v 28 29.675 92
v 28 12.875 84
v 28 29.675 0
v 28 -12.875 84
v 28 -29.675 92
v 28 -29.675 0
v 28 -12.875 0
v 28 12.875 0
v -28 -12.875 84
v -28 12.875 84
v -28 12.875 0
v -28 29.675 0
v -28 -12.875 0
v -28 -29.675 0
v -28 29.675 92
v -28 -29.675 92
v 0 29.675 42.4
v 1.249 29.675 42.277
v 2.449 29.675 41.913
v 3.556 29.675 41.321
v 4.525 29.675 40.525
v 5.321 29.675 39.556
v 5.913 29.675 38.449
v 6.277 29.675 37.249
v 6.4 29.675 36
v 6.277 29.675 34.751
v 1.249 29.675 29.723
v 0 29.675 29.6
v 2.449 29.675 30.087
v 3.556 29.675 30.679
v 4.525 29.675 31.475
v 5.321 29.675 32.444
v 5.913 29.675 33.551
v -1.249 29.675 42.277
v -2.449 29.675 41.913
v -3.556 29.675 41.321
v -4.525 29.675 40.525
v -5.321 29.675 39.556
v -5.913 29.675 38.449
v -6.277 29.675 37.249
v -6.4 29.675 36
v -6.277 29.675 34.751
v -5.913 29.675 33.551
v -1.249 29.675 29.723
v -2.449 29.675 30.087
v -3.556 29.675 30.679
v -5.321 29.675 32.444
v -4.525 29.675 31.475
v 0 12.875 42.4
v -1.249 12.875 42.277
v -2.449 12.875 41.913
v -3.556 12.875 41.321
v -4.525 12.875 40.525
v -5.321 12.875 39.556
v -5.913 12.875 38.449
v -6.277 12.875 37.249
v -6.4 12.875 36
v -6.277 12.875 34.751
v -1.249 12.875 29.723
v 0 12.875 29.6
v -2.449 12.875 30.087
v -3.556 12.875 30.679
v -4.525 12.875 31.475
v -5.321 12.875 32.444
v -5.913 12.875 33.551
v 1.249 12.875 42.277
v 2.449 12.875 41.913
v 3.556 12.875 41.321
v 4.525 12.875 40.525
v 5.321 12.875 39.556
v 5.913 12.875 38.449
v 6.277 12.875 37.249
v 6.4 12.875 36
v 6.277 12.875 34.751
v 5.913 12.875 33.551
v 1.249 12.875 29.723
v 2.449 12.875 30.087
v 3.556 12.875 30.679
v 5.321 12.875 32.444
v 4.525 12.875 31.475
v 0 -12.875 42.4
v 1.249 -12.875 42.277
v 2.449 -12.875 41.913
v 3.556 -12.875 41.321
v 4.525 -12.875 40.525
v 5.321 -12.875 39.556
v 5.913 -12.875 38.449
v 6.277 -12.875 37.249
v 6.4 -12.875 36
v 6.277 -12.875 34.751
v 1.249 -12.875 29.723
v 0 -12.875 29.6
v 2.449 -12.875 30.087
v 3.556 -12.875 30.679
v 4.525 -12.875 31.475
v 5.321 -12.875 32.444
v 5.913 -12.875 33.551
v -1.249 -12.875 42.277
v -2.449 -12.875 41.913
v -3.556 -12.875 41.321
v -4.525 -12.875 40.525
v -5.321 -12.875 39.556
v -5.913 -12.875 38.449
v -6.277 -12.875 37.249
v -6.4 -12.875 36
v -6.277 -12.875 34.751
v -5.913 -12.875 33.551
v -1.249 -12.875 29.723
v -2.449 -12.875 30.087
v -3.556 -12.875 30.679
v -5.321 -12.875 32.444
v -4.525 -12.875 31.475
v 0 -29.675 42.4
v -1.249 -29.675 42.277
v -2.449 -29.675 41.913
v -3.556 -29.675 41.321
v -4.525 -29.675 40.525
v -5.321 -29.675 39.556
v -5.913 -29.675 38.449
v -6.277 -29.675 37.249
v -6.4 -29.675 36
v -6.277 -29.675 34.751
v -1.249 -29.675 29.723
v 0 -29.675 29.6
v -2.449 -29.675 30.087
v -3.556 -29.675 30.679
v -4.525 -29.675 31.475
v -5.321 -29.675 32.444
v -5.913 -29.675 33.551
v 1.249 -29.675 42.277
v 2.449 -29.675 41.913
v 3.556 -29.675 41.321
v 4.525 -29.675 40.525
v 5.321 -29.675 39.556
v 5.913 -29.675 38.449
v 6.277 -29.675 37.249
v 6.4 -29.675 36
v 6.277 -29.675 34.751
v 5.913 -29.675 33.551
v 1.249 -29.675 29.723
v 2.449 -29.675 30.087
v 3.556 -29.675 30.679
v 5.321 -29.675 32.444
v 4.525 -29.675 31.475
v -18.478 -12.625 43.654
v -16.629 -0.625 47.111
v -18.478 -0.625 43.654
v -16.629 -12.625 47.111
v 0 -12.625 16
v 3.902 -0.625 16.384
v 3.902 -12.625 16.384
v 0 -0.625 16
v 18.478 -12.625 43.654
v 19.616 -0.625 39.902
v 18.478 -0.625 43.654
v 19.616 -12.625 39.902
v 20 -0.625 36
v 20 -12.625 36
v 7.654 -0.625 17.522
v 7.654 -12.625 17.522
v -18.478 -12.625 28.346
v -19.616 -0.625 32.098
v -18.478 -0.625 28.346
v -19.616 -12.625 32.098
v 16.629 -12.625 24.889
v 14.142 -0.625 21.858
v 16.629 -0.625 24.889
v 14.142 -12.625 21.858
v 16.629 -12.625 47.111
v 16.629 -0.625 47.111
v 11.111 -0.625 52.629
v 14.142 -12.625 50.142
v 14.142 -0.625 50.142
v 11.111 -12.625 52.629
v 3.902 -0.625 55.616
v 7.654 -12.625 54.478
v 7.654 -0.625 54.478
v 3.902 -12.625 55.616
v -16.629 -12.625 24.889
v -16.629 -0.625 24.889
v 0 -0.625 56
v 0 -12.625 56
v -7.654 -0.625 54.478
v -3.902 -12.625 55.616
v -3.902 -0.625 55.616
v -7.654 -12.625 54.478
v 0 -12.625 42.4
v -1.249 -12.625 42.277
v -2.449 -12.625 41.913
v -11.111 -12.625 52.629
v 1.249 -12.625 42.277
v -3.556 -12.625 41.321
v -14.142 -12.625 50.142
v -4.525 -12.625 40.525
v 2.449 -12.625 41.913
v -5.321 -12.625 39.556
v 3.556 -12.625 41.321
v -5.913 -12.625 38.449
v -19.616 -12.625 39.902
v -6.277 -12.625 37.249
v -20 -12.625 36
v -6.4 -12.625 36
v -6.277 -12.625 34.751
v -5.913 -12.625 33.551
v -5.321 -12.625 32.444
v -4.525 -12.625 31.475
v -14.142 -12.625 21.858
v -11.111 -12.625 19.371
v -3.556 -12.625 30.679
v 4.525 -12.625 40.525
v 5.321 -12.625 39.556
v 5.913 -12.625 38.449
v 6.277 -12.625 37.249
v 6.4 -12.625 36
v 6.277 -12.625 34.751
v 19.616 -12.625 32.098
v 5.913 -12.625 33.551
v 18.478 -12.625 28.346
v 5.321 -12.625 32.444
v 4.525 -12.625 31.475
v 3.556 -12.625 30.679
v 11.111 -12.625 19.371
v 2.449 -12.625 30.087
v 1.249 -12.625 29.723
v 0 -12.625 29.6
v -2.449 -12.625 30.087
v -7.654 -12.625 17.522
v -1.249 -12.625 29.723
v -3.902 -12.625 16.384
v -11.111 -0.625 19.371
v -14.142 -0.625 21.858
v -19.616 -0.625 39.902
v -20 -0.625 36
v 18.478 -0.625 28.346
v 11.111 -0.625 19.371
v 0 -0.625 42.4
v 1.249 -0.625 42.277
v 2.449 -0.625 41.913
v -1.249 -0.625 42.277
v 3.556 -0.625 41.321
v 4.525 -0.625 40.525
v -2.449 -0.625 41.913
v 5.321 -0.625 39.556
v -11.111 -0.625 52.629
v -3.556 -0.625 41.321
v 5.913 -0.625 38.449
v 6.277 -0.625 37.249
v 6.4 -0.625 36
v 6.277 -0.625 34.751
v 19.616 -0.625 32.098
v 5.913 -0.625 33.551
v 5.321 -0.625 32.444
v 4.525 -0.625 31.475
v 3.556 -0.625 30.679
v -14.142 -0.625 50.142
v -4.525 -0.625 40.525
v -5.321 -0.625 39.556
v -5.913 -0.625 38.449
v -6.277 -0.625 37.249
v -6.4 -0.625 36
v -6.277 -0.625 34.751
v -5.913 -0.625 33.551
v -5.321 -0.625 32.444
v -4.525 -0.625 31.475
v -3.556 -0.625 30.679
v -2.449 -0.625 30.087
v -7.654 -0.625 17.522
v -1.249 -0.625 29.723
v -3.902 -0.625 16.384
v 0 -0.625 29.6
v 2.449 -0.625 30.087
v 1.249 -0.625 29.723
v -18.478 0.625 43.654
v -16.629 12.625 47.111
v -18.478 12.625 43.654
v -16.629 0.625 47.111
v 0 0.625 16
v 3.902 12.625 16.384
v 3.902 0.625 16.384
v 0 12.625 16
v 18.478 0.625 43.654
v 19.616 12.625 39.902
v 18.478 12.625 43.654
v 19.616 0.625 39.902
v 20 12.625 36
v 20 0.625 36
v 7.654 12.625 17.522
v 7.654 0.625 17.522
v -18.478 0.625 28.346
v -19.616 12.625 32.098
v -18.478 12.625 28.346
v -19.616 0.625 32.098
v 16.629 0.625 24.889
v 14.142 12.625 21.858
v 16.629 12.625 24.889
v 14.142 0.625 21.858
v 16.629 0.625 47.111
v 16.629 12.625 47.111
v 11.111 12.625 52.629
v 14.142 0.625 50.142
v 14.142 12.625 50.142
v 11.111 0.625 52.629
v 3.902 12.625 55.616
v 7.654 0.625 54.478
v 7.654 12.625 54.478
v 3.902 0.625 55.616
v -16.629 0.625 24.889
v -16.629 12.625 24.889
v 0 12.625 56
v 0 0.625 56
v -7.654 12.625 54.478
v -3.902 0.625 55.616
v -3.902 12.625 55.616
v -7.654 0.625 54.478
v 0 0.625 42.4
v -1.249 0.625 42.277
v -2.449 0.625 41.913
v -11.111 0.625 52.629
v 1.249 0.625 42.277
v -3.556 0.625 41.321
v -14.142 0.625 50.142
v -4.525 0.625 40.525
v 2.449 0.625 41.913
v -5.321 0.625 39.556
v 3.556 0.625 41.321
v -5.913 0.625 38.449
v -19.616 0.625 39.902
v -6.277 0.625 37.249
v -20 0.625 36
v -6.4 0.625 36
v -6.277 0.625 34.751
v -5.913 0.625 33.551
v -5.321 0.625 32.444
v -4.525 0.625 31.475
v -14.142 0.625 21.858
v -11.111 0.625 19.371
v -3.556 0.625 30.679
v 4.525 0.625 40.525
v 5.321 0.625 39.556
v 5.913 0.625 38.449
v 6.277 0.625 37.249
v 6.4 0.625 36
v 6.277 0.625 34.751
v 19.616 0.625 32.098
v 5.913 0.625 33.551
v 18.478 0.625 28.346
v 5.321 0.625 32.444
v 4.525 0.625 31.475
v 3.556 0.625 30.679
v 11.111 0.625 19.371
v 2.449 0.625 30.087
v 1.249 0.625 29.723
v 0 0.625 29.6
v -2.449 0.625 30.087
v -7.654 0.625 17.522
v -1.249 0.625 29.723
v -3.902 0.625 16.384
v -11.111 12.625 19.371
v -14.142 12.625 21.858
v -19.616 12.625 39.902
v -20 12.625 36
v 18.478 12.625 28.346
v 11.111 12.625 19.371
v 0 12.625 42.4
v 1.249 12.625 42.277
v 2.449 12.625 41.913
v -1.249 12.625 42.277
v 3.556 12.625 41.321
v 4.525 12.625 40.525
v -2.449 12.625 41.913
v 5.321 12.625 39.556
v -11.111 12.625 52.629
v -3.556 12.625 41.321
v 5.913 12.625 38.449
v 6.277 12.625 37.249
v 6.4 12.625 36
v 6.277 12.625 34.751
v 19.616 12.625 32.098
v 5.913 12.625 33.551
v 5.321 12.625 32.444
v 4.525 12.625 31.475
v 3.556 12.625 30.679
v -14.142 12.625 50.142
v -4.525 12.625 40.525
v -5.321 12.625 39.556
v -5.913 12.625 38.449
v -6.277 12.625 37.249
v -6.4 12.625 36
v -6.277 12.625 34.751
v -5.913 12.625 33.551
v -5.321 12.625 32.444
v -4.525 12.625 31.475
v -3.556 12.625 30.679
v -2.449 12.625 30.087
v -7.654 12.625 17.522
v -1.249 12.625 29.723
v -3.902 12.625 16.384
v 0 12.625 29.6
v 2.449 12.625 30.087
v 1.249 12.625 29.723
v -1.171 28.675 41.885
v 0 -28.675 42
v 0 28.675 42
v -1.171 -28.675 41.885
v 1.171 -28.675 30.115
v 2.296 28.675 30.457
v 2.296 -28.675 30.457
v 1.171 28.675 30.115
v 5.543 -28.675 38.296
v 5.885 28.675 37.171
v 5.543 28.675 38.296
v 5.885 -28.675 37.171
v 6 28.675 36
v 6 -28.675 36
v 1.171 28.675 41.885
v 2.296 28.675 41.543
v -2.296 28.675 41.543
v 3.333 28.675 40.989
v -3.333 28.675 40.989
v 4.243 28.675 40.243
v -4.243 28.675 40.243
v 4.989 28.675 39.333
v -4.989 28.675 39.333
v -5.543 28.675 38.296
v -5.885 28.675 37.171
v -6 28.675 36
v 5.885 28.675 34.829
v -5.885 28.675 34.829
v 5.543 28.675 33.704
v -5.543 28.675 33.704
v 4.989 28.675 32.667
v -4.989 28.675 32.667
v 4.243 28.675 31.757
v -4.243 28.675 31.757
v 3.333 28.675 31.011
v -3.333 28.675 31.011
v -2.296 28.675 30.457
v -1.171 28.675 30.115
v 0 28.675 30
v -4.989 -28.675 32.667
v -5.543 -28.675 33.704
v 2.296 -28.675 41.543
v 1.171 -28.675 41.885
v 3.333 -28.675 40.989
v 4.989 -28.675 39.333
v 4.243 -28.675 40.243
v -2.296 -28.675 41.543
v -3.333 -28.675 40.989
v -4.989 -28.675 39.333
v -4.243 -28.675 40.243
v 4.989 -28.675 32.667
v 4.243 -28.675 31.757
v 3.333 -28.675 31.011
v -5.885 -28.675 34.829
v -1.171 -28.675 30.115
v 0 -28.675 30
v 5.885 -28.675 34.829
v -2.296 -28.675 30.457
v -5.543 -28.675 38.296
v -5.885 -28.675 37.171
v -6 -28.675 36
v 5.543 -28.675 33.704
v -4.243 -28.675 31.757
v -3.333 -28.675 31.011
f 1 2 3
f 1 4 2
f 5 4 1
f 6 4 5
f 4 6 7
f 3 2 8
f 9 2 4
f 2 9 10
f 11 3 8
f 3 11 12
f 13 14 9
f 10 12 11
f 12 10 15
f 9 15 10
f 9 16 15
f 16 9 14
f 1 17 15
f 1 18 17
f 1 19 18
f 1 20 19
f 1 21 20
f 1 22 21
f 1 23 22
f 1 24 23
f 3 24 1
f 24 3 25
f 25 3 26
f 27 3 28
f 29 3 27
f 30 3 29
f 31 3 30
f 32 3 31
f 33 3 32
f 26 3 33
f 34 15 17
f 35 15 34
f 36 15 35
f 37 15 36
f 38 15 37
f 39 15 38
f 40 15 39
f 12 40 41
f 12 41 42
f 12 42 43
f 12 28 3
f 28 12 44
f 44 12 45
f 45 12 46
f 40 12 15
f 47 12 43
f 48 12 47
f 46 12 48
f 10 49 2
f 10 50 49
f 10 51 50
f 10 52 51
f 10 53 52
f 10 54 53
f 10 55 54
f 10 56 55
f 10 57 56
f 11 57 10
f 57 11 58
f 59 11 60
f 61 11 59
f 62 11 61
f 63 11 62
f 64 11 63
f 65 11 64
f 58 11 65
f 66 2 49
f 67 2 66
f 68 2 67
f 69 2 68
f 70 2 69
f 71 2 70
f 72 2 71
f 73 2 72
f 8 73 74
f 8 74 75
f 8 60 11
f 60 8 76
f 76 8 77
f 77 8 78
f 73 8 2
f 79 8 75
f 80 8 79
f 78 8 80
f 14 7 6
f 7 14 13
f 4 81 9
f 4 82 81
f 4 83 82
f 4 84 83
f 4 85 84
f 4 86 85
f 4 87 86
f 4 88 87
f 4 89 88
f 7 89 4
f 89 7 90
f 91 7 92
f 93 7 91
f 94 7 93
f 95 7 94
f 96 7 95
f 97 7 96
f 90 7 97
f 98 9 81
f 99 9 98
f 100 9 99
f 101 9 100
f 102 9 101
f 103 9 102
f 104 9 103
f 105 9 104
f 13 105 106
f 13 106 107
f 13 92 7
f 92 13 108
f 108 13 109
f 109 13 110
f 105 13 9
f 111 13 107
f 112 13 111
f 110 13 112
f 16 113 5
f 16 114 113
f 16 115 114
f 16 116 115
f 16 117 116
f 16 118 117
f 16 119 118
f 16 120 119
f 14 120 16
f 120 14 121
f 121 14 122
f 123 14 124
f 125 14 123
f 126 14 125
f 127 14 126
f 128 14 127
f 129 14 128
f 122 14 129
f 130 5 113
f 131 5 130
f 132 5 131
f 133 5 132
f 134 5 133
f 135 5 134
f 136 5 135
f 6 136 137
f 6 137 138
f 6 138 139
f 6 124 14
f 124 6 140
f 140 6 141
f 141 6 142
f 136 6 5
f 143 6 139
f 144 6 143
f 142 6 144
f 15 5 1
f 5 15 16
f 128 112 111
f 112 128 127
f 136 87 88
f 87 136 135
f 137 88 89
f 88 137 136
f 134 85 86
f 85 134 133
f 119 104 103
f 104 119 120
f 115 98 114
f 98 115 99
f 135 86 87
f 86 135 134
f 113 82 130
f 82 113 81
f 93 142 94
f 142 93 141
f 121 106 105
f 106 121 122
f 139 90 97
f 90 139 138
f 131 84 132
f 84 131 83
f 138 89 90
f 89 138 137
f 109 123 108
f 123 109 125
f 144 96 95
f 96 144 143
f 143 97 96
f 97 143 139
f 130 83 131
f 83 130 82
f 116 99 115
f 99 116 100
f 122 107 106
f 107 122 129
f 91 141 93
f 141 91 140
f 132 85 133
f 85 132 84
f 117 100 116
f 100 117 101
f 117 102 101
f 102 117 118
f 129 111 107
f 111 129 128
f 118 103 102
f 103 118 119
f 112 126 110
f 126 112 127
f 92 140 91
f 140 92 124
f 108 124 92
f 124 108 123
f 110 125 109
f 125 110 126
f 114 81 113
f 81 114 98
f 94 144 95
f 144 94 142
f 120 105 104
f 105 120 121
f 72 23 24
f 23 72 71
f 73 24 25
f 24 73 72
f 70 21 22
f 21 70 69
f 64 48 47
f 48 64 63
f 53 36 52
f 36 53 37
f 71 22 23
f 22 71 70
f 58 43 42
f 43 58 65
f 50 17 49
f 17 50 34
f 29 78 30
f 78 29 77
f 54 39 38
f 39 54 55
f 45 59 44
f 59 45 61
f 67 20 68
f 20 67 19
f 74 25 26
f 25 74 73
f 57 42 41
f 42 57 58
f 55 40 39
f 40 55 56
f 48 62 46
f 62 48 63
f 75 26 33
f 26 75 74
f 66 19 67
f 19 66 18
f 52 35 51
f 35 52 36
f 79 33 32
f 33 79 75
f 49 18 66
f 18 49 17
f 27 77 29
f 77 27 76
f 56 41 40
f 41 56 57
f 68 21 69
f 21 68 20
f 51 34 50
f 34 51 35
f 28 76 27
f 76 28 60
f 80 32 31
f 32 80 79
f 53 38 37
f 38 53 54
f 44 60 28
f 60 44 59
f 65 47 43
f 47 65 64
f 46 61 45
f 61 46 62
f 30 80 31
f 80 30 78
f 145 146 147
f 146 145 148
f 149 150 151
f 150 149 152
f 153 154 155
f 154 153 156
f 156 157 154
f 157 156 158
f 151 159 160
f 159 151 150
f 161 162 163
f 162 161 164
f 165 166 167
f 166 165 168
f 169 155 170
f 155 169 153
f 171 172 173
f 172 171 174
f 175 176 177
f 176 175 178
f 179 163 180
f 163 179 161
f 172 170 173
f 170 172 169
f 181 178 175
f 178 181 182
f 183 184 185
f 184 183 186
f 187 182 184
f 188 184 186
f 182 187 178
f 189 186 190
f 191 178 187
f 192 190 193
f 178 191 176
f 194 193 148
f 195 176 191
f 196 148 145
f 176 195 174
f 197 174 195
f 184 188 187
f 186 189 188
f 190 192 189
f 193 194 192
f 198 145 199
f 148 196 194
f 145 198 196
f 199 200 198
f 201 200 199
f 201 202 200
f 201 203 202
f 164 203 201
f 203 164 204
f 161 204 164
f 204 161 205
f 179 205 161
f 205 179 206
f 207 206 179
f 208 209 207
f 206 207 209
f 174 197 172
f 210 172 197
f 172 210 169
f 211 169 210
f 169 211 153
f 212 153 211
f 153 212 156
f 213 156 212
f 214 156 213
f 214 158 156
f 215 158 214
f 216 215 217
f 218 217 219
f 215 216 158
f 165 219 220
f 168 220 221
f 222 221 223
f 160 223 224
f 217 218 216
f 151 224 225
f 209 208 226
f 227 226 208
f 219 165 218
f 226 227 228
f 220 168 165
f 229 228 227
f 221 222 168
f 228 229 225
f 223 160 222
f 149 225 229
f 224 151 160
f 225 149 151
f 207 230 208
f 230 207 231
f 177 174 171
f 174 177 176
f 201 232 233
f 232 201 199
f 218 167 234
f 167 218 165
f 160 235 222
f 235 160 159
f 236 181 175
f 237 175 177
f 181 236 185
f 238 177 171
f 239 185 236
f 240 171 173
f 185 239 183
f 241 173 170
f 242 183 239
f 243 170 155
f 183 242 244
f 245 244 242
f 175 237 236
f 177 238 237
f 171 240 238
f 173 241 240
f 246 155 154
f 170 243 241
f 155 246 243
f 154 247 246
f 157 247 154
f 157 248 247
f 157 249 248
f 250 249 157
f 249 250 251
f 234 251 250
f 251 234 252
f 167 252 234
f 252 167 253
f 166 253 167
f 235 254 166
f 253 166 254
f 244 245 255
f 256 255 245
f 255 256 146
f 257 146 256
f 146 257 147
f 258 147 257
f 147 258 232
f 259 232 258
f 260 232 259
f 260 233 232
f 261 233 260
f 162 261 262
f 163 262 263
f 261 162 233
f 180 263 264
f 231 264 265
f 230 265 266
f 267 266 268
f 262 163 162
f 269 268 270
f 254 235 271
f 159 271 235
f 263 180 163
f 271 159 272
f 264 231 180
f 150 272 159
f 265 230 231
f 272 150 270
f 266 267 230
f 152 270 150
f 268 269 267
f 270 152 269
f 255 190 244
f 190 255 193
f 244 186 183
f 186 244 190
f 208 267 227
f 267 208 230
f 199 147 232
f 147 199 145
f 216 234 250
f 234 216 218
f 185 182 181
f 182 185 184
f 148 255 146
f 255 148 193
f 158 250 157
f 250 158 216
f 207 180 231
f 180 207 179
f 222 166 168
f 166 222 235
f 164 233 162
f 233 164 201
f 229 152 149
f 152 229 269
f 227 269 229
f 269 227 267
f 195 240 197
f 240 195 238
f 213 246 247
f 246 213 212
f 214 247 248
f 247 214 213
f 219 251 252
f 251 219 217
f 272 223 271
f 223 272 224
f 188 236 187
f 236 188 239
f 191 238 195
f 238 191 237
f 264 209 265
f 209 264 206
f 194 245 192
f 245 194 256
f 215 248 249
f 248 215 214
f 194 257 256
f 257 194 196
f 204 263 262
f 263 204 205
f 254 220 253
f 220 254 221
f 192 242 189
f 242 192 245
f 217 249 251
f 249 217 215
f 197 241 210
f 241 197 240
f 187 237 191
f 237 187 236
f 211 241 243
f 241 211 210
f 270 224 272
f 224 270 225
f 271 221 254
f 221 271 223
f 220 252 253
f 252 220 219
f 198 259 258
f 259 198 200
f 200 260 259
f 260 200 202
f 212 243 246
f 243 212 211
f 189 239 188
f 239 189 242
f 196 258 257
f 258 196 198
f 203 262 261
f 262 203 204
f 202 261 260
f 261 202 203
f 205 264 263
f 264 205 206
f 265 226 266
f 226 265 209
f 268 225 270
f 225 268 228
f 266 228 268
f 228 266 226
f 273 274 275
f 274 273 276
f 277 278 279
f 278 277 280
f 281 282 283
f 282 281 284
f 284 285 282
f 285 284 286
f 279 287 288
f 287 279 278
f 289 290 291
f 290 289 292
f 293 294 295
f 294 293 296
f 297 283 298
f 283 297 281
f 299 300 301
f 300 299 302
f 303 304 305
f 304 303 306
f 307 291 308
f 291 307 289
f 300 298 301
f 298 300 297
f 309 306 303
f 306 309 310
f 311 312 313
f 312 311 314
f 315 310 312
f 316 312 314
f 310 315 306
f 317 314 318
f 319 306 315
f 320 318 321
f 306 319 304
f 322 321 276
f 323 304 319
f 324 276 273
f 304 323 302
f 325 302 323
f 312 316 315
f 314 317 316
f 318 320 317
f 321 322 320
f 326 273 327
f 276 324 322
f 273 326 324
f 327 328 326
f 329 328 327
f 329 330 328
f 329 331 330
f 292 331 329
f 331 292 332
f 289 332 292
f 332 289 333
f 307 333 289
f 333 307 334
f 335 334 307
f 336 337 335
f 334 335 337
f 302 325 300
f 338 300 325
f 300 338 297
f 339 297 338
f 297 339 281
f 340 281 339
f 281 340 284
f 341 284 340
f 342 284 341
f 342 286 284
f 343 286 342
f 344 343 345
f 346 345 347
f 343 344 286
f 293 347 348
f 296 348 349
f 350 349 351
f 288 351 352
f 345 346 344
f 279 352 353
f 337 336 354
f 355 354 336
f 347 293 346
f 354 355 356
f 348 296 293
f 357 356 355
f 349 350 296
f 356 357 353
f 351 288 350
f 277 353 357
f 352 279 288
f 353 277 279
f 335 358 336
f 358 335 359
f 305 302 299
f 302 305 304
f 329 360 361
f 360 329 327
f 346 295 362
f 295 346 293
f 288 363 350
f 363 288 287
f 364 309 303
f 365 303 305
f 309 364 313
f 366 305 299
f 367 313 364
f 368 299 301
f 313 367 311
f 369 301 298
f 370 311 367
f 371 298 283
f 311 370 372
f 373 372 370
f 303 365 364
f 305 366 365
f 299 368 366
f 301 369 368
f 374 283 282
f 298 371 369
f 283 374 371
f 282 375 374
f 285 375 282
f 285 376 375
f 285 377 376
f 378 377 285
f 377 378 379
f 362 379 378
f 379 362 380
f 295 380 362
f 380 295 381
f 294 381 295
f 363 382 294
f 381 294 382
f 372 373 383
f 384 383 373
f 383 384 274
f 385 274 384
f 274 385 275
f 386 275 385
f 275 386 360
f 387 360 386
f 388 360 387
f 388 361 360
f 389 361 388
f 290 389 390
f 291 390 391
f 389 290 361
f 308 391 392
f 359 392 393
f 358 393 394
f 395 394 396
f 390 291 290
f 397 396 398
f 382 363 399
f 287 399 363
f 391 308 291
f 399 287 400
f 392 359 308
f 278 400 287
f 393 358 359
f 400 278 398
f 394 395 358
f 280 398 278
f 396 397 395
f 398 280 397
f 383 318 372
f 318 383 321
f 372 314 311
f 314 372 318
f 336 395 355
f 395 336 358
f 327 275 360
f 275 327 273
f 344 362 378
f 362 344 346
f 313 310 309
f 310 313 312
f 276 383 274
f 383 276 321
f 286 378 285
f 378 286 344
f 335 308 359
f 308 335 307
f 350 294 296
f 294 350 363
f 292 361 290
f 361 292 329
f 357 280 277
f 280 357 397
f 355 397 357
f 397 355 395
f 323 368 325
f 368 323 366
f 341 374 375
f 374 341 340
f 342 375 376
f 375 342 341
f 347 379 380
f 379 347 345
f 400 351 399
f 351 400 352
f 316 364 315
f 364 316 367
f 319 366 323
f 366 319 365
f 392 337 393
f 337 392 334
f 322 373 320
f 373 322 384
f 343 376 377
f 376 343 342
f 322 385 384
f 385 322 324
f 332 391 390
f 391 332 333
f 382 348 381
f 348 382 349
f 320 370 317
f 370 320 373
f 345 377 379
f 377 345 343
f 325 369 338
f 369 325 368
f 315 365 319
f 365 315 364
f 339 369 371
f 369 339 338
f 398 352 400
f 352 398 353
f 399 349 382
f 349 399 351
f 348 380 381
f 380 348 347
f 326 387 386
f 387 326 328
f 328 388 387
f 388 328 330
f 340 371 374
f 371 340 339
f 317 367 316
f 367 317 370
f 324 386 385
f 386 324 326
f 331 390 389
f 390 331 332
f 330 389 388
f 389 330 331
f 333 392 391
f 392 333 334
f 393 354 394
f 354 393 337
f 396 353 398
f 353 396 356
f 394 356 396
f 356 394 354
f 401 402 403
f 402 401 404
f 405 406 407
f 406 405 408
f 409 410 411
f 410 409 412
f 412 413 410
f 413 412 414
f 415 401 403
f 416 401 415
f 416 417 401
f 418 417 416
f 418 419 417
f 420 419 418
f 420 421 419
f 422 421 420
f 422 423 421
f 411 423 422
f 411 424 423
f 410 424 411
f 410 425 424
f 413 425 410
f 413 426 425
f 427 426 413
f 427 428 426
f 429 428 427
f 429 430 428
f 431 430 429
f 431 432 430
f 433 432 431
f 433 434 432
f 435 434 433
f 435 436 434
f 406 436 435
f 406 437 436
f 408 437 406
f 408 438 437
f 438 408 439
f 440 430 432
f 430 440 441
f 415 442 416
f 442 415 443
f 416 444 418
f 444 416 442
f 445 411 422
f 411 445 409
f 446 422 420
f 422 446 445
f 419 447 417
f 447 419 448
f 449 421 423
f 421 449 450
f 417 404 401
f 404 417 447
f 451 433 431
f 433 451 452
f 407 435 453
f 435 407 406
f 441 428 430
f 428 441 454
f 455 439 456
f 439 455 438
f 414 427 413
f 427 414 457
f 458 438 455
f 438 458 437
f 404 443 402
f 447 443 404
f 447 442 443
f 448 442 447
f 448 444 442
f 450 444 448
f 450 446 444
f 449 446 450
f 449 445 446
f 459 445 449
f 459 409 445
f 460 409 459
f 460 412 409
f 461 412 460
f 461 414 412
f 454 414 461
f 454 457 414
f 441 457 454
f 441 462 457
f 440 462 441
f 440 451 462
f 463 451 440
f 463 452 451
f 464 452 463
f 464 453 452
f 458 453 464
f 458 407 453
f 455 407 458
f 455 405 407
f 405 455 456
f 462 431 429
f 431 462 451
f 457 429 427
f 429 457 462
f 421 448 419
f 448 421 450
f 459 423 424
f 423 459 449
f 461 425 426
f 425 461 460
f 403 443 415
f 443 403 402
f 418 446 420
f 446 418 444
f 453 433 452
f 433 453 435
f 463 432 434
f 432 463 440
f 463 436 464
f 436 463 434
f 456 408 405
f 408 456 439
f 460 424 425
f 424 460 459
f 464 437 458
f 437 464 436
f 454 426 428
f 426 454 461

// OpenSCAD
$fn = 32;

// ------------------------------------------------------------------------
// Trolley wheel set: wheels d40, fork 84 mm tall
// Every part is its own module, assembly() places every instance.
// ------------------------------------------------------------------------

// --- part 1 ---
module trolley_fork() {
  difference() {
    union() {
      translate([-28, 12.875, 0]) cube([56, 16.8, 84]);
      translate([-28, -29.675, 0]) cube([56, 16.8, 84]);
      translate([-28, -29.675, 84]) cube([56, 59.35, 8]);
    }
    translate([0, -21.275, 36]) rotate([90, 0, 0]) cylinder(h = 18.8, d = 12.8, center = true);
    translate([0, 21.275, 36]) rotate([90, 0, 0]) cylinder(h = 18.8, d = 12.8, center = true);
  }
}

// --- part 2 ---
module trolley_wheel() {
  difference() {
      translate([0, 0, 0]) cylinder(h = 12, d = 40);
      translate([0, 0, -1]) cylinder(h = 14, d = 12.8);
    }
}

// --- part 3 ---
module trolley_axle() {
  translate([0, 0, -28.675]) cylinder(h = 57.35, d = 12);
}

// --- assembly ---
module assembly() {
  color([0.80, 0.24, 0.20]) translate([0, 0, 0]) rotate([0, 0, 0]) trolley_fork();
  color([0.20, 0.45, 0.75]) translate([0, -0.625, 36]) rotate([90, 0, 0]) trolley_wheel();
  color([0.25, 0.62, 0.32]) translate([0, 12.625, 36]) rotate([90, 0, 0]) trolley_wheel();
  color([0.92, 0.70, 0.18]) translate([0, 0, 36]) rotate([90, 0, 0]) trolley_axle();
}

assembly();
